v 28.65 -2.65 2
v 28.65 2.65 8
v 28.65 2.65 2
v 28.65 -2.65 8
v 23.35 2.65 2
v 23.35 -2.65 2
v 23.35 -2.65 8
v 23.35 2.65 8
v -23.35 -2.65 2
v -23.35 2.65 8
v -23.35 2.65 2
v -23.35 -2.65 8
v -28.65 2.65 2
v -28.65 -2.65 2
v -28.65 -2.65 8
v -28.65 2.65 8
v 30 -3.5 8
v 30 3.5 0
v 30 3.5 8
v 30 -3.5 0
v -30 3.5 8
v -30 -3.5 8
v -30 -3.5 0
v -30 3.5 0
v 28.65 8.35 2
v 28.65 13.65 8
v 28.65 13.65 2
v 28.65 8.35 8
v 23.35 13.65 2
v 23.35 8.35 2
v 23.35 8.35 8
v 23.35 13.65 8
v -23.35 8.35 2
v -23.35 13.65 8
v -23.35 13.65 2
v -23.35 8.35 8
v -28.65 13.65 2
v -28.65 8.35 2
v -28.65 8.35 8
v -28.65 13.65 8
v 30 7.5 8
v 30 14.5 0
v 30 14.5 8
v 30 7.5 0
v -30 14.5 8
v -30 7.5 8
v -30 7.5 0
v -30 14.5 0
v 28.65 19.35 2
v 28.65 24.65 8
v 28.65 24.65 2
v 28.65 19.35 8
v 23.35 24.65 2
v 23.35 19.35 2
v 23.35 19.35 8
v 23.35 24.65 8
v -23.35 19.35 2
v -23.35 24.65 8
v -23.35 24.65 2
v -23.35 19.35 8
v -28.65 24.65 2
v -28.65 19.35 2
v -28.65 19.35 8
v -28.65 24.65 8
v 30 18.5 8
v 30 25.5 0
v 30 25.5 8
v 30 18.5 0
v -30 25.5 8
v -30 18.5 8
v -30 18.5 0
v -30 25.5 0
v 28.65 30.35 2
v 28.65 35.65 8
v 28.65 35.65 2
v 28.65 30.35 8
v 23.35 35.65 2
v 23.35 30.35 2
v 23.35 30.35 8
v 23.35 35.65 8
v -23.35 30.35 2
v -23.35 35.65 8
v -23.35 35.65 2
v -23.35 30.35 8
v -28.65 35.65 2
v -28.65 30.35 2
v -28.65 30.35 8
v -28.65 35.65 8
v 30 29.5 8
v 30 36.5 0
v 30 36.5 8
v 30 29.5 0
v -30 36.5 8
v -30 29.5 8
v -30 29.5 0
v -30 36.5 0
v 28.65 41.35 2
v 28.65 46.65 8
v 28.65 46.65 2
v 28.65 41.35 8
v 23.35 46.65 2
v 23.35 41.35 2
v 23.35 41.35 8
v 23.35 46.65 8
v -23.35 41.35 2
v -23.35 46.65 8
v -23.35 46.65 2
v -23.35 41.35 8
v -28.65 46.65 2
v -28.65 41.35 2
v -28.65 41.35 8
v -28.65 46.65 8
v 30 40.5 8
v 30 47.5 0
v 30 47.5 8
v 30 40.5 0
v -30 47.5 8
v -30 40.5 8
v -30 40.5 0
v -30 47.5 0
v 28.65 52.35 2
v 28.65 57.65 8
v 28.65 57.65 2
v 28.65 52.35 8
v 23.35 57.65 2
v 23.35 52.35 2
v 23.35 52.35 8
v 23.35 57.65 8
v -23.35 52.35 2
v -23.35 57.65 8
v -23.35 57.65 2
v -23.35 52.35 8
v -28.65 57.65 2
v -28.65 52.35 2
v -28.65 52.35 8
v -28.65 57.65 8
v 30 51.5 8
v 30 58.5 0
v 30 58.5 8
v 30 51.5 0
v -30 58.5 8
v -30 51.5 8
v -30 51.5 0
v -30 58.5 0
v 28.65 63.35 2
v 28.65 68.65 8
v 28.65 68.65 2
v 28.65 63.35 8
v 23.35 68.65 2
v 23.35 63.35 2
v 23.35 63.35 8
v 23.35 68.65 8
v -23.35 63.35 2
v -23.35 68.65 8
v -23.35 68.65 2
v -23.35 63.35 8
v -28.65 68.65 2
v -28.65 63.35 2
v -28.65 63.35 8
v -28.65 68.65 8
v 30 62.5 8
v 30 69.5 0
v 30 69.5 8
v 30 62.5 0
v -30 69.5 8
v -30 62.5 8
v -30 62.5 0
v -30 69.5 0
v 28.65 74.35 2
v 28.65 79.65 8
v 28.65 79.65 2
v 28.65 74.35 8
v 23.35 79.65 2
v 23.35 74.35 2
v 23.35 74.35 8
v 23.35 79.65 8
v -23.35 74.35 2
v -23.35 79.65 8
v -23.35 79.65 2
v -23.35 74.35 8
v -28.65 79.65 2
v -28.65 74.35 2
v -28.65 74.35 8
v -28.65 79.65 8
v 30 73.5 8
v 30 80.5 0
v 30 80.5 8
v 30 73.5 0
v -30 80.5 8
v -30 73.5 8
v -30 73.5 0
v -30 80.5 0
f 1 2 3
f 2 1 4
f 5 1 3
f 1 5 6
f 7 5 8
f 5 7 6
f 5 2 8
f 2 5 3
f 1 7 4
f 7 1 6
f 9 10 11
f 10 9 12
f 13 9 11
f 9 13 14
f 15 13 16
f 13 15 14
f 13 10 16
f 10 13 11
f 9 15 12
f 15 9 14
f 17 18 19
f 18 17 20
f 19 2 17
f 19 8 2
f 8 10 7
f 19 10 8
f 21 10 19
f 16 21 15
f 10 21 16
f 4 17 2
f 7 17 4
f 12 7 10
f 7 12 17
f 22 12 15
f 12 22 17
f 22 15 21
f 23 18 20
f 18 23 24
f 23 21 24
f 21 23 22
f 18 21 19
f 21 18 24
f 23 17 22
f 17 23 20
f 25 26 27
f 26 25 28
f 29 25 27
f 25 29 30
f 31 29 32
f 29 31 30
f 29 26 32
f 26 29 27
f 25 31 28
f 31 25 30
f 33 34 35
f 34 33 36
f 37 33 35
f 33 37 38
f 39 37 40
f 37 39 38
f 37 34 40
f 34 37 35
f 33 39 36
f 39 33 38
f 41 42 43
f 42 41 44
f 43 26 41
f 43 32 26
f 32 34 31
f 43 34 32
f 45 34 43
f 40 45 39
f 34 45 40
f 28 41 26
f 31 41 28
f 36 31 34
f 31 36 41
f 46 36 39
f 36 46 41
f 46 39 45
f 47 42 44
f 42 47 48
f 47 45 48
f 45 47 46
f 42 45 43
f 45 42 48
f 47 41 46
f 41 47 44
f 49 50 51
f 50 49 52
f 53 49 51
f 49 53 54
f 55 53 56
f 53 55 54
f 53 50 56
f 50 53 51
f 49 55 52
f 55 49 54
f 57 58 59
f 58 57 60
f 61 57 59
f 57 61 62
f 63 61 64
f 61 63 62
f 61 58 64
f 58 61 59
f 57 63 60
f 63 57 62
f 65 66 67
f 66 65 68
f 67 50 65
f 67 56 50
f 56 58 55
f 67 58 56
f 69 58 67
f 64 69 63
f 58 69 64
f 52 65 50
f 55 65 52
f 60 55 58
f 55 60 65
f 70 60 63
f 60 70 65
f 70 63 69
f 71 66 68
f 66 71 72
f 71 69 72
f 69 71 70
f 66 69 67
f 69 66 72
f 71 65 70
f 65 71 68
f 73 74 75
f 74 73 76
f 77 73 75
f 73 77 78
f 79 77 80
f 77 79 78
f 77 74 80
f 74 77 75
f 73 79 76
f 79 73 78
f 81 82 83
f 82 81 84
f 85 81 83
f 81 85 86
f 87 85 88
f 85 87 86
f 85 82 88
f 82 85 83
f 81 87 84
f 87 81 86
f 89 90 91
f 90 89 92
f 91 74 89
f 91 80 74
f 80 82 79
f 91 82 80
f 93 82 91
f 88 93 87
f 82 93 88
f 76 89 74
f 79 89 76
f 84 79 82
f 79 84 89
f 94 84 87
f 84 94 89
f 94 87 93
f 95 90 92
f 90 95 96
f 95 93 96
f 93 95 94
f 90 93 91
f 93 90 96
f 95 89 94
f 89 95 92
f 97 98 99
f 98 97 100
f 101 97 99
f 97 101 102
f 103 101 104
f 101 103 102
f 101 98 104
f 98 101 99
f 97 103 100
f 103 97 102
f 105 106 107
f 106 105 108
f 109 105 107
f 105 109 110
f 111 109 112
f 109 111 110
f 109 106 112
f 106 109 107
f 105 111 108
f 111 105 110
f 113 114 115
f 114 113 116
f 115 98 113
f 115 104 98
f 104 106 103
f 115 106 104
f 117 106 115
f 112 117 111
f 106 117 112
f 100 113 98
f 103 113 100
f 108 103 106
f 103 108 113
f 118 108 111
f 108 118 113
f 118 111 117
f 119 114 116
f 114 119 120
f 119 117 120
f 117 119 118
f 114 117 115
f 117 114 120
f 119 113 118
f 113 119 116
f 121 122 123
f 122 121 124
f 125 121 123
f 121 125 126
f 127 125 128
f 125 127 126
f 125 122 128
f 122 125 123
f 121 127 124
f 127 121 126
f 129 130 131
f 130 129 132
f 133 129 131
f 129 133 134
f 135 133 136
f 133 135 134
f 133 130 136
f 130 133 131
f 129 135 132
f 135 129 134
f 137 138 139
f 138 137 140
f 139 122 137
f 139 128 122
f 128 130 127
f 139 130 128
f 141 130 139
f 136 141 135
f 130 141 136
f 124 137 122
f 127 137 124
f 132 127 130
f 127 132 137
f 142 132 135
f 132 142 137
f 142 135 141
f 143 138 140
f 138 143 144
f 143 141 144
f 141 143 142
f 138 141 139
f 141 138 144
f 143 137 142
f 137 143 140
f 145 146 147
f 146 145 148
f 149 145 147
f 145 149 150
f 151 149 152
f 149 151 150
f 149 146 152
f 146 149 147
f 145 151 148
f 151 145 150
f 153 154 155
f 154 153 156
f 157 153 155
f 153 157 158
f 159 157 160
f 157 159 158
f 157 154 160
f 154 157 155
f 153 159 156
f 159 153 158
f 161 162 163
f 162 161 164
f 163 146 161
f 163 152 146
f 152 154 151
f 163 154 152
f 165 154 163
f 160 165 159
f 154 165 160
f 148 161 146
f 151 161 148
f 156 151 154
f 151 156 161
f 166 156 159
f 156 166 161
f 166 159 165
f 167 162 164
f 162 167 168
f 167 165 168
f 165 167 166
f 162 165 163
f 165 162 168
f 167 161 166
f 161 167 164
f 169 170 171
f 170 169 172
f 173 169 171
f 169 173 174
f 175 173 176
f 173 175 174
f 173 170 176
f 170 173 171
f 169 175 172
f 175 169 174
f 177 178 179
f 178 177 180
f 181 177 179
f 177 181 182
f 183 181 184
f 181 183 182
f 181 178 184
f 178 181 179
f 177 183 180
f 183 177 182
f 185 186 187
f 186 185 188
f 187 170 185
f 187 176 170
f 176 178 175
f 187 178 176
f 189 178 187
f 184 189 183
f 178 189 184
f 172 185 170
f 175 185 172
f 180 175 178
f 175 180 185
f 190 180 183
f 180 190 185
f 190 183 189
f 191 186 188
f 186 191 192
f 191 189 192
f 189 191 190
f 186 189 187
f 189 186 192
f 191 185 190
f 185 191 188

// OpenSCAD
// 屏風（びょうぶ）の框（わく）：印刷するのは上下の横木だけ。縦は 5mm 角の角棒（100円ショップ等）
//  1扇 = 横木2本＋角棒2本。4扇で四曲一隻。扇どうしの蝶番は布テープ（本物の屏風も紙の蝶番）
//  完成高さ = ROD_LEN + 2*(RAIL_H - SOCKET_DEPTH)。角棒 246mm で 250mm
part = "plate";  // "rail" | "plate"（横木8本をまとめて1枚に）| "assembly"

PANEL_W = 60;
RAIL_H = 8; RAIL_T = 7;
ROD = 5; ROD_CLR = 0.3; SOCKET_DEPTH = 6;
ROD_INSET = 4;     // 横木の端から角棒の中心まで
ROD_LEN = 246;

module rail() {
  difference() {
    translate([-PANEL_W / 2, -RAIL_T / 2, 0]) cube([PANEL_W, RAIL_T, RAIL_H]);
    for (s = [1, -1]) translate([s * (PANEL_W / 2 - ROD_INSET) - (ROD + ROD_CLR) / 2, -(ROD + ROD_CLR) / 2, RAIL_H - SOCKET_DEPTH])
      cube([ROD + ROD_CLR, ROD + ROD_CLR, SOCKET_DEPTH + 1]);
  }
}

module panel() {
  color("goldenrod") {
    rail();
    translate([0, 0, 2 * RAIL_H + ROD_LEN - 2 * SOCKET_DEPTH]) mirror([0, 0, 1]) rail();
    for (s = [1, -1]) translate([s * (PANEL_W / 2 - ROD_INSET) - ROD / 2, -ROD / 2, RAIL_H - SOCKET_DEPTH]) cube([ROD, ROD, ROD_LEN]);
  }
  color("ivory", 0.9) translate([-PANEL_W / 2, -RAIL_T / 2 - 0.5, RAIL_H]) cube([PANEL_W, 0.3, ROD_LEN - 2 * SOCKET_DEPTH]);
}

if (part == "rail") rail();
else if (part == "plate") for (i = [0 : 7]) translate([0, i * (RAIL_T + 4), 0]) rail();
else {
  // ジグザグに開いた状態
  for (i = [0 : 3]) translate([(i - 1.5) * PANEL_W * cos(25), (i % 2) * PANEL_W * sin(25), 0])
    rotate([0, 0, (i % 2 == 0) ? 25 : -25]) panel();
}
